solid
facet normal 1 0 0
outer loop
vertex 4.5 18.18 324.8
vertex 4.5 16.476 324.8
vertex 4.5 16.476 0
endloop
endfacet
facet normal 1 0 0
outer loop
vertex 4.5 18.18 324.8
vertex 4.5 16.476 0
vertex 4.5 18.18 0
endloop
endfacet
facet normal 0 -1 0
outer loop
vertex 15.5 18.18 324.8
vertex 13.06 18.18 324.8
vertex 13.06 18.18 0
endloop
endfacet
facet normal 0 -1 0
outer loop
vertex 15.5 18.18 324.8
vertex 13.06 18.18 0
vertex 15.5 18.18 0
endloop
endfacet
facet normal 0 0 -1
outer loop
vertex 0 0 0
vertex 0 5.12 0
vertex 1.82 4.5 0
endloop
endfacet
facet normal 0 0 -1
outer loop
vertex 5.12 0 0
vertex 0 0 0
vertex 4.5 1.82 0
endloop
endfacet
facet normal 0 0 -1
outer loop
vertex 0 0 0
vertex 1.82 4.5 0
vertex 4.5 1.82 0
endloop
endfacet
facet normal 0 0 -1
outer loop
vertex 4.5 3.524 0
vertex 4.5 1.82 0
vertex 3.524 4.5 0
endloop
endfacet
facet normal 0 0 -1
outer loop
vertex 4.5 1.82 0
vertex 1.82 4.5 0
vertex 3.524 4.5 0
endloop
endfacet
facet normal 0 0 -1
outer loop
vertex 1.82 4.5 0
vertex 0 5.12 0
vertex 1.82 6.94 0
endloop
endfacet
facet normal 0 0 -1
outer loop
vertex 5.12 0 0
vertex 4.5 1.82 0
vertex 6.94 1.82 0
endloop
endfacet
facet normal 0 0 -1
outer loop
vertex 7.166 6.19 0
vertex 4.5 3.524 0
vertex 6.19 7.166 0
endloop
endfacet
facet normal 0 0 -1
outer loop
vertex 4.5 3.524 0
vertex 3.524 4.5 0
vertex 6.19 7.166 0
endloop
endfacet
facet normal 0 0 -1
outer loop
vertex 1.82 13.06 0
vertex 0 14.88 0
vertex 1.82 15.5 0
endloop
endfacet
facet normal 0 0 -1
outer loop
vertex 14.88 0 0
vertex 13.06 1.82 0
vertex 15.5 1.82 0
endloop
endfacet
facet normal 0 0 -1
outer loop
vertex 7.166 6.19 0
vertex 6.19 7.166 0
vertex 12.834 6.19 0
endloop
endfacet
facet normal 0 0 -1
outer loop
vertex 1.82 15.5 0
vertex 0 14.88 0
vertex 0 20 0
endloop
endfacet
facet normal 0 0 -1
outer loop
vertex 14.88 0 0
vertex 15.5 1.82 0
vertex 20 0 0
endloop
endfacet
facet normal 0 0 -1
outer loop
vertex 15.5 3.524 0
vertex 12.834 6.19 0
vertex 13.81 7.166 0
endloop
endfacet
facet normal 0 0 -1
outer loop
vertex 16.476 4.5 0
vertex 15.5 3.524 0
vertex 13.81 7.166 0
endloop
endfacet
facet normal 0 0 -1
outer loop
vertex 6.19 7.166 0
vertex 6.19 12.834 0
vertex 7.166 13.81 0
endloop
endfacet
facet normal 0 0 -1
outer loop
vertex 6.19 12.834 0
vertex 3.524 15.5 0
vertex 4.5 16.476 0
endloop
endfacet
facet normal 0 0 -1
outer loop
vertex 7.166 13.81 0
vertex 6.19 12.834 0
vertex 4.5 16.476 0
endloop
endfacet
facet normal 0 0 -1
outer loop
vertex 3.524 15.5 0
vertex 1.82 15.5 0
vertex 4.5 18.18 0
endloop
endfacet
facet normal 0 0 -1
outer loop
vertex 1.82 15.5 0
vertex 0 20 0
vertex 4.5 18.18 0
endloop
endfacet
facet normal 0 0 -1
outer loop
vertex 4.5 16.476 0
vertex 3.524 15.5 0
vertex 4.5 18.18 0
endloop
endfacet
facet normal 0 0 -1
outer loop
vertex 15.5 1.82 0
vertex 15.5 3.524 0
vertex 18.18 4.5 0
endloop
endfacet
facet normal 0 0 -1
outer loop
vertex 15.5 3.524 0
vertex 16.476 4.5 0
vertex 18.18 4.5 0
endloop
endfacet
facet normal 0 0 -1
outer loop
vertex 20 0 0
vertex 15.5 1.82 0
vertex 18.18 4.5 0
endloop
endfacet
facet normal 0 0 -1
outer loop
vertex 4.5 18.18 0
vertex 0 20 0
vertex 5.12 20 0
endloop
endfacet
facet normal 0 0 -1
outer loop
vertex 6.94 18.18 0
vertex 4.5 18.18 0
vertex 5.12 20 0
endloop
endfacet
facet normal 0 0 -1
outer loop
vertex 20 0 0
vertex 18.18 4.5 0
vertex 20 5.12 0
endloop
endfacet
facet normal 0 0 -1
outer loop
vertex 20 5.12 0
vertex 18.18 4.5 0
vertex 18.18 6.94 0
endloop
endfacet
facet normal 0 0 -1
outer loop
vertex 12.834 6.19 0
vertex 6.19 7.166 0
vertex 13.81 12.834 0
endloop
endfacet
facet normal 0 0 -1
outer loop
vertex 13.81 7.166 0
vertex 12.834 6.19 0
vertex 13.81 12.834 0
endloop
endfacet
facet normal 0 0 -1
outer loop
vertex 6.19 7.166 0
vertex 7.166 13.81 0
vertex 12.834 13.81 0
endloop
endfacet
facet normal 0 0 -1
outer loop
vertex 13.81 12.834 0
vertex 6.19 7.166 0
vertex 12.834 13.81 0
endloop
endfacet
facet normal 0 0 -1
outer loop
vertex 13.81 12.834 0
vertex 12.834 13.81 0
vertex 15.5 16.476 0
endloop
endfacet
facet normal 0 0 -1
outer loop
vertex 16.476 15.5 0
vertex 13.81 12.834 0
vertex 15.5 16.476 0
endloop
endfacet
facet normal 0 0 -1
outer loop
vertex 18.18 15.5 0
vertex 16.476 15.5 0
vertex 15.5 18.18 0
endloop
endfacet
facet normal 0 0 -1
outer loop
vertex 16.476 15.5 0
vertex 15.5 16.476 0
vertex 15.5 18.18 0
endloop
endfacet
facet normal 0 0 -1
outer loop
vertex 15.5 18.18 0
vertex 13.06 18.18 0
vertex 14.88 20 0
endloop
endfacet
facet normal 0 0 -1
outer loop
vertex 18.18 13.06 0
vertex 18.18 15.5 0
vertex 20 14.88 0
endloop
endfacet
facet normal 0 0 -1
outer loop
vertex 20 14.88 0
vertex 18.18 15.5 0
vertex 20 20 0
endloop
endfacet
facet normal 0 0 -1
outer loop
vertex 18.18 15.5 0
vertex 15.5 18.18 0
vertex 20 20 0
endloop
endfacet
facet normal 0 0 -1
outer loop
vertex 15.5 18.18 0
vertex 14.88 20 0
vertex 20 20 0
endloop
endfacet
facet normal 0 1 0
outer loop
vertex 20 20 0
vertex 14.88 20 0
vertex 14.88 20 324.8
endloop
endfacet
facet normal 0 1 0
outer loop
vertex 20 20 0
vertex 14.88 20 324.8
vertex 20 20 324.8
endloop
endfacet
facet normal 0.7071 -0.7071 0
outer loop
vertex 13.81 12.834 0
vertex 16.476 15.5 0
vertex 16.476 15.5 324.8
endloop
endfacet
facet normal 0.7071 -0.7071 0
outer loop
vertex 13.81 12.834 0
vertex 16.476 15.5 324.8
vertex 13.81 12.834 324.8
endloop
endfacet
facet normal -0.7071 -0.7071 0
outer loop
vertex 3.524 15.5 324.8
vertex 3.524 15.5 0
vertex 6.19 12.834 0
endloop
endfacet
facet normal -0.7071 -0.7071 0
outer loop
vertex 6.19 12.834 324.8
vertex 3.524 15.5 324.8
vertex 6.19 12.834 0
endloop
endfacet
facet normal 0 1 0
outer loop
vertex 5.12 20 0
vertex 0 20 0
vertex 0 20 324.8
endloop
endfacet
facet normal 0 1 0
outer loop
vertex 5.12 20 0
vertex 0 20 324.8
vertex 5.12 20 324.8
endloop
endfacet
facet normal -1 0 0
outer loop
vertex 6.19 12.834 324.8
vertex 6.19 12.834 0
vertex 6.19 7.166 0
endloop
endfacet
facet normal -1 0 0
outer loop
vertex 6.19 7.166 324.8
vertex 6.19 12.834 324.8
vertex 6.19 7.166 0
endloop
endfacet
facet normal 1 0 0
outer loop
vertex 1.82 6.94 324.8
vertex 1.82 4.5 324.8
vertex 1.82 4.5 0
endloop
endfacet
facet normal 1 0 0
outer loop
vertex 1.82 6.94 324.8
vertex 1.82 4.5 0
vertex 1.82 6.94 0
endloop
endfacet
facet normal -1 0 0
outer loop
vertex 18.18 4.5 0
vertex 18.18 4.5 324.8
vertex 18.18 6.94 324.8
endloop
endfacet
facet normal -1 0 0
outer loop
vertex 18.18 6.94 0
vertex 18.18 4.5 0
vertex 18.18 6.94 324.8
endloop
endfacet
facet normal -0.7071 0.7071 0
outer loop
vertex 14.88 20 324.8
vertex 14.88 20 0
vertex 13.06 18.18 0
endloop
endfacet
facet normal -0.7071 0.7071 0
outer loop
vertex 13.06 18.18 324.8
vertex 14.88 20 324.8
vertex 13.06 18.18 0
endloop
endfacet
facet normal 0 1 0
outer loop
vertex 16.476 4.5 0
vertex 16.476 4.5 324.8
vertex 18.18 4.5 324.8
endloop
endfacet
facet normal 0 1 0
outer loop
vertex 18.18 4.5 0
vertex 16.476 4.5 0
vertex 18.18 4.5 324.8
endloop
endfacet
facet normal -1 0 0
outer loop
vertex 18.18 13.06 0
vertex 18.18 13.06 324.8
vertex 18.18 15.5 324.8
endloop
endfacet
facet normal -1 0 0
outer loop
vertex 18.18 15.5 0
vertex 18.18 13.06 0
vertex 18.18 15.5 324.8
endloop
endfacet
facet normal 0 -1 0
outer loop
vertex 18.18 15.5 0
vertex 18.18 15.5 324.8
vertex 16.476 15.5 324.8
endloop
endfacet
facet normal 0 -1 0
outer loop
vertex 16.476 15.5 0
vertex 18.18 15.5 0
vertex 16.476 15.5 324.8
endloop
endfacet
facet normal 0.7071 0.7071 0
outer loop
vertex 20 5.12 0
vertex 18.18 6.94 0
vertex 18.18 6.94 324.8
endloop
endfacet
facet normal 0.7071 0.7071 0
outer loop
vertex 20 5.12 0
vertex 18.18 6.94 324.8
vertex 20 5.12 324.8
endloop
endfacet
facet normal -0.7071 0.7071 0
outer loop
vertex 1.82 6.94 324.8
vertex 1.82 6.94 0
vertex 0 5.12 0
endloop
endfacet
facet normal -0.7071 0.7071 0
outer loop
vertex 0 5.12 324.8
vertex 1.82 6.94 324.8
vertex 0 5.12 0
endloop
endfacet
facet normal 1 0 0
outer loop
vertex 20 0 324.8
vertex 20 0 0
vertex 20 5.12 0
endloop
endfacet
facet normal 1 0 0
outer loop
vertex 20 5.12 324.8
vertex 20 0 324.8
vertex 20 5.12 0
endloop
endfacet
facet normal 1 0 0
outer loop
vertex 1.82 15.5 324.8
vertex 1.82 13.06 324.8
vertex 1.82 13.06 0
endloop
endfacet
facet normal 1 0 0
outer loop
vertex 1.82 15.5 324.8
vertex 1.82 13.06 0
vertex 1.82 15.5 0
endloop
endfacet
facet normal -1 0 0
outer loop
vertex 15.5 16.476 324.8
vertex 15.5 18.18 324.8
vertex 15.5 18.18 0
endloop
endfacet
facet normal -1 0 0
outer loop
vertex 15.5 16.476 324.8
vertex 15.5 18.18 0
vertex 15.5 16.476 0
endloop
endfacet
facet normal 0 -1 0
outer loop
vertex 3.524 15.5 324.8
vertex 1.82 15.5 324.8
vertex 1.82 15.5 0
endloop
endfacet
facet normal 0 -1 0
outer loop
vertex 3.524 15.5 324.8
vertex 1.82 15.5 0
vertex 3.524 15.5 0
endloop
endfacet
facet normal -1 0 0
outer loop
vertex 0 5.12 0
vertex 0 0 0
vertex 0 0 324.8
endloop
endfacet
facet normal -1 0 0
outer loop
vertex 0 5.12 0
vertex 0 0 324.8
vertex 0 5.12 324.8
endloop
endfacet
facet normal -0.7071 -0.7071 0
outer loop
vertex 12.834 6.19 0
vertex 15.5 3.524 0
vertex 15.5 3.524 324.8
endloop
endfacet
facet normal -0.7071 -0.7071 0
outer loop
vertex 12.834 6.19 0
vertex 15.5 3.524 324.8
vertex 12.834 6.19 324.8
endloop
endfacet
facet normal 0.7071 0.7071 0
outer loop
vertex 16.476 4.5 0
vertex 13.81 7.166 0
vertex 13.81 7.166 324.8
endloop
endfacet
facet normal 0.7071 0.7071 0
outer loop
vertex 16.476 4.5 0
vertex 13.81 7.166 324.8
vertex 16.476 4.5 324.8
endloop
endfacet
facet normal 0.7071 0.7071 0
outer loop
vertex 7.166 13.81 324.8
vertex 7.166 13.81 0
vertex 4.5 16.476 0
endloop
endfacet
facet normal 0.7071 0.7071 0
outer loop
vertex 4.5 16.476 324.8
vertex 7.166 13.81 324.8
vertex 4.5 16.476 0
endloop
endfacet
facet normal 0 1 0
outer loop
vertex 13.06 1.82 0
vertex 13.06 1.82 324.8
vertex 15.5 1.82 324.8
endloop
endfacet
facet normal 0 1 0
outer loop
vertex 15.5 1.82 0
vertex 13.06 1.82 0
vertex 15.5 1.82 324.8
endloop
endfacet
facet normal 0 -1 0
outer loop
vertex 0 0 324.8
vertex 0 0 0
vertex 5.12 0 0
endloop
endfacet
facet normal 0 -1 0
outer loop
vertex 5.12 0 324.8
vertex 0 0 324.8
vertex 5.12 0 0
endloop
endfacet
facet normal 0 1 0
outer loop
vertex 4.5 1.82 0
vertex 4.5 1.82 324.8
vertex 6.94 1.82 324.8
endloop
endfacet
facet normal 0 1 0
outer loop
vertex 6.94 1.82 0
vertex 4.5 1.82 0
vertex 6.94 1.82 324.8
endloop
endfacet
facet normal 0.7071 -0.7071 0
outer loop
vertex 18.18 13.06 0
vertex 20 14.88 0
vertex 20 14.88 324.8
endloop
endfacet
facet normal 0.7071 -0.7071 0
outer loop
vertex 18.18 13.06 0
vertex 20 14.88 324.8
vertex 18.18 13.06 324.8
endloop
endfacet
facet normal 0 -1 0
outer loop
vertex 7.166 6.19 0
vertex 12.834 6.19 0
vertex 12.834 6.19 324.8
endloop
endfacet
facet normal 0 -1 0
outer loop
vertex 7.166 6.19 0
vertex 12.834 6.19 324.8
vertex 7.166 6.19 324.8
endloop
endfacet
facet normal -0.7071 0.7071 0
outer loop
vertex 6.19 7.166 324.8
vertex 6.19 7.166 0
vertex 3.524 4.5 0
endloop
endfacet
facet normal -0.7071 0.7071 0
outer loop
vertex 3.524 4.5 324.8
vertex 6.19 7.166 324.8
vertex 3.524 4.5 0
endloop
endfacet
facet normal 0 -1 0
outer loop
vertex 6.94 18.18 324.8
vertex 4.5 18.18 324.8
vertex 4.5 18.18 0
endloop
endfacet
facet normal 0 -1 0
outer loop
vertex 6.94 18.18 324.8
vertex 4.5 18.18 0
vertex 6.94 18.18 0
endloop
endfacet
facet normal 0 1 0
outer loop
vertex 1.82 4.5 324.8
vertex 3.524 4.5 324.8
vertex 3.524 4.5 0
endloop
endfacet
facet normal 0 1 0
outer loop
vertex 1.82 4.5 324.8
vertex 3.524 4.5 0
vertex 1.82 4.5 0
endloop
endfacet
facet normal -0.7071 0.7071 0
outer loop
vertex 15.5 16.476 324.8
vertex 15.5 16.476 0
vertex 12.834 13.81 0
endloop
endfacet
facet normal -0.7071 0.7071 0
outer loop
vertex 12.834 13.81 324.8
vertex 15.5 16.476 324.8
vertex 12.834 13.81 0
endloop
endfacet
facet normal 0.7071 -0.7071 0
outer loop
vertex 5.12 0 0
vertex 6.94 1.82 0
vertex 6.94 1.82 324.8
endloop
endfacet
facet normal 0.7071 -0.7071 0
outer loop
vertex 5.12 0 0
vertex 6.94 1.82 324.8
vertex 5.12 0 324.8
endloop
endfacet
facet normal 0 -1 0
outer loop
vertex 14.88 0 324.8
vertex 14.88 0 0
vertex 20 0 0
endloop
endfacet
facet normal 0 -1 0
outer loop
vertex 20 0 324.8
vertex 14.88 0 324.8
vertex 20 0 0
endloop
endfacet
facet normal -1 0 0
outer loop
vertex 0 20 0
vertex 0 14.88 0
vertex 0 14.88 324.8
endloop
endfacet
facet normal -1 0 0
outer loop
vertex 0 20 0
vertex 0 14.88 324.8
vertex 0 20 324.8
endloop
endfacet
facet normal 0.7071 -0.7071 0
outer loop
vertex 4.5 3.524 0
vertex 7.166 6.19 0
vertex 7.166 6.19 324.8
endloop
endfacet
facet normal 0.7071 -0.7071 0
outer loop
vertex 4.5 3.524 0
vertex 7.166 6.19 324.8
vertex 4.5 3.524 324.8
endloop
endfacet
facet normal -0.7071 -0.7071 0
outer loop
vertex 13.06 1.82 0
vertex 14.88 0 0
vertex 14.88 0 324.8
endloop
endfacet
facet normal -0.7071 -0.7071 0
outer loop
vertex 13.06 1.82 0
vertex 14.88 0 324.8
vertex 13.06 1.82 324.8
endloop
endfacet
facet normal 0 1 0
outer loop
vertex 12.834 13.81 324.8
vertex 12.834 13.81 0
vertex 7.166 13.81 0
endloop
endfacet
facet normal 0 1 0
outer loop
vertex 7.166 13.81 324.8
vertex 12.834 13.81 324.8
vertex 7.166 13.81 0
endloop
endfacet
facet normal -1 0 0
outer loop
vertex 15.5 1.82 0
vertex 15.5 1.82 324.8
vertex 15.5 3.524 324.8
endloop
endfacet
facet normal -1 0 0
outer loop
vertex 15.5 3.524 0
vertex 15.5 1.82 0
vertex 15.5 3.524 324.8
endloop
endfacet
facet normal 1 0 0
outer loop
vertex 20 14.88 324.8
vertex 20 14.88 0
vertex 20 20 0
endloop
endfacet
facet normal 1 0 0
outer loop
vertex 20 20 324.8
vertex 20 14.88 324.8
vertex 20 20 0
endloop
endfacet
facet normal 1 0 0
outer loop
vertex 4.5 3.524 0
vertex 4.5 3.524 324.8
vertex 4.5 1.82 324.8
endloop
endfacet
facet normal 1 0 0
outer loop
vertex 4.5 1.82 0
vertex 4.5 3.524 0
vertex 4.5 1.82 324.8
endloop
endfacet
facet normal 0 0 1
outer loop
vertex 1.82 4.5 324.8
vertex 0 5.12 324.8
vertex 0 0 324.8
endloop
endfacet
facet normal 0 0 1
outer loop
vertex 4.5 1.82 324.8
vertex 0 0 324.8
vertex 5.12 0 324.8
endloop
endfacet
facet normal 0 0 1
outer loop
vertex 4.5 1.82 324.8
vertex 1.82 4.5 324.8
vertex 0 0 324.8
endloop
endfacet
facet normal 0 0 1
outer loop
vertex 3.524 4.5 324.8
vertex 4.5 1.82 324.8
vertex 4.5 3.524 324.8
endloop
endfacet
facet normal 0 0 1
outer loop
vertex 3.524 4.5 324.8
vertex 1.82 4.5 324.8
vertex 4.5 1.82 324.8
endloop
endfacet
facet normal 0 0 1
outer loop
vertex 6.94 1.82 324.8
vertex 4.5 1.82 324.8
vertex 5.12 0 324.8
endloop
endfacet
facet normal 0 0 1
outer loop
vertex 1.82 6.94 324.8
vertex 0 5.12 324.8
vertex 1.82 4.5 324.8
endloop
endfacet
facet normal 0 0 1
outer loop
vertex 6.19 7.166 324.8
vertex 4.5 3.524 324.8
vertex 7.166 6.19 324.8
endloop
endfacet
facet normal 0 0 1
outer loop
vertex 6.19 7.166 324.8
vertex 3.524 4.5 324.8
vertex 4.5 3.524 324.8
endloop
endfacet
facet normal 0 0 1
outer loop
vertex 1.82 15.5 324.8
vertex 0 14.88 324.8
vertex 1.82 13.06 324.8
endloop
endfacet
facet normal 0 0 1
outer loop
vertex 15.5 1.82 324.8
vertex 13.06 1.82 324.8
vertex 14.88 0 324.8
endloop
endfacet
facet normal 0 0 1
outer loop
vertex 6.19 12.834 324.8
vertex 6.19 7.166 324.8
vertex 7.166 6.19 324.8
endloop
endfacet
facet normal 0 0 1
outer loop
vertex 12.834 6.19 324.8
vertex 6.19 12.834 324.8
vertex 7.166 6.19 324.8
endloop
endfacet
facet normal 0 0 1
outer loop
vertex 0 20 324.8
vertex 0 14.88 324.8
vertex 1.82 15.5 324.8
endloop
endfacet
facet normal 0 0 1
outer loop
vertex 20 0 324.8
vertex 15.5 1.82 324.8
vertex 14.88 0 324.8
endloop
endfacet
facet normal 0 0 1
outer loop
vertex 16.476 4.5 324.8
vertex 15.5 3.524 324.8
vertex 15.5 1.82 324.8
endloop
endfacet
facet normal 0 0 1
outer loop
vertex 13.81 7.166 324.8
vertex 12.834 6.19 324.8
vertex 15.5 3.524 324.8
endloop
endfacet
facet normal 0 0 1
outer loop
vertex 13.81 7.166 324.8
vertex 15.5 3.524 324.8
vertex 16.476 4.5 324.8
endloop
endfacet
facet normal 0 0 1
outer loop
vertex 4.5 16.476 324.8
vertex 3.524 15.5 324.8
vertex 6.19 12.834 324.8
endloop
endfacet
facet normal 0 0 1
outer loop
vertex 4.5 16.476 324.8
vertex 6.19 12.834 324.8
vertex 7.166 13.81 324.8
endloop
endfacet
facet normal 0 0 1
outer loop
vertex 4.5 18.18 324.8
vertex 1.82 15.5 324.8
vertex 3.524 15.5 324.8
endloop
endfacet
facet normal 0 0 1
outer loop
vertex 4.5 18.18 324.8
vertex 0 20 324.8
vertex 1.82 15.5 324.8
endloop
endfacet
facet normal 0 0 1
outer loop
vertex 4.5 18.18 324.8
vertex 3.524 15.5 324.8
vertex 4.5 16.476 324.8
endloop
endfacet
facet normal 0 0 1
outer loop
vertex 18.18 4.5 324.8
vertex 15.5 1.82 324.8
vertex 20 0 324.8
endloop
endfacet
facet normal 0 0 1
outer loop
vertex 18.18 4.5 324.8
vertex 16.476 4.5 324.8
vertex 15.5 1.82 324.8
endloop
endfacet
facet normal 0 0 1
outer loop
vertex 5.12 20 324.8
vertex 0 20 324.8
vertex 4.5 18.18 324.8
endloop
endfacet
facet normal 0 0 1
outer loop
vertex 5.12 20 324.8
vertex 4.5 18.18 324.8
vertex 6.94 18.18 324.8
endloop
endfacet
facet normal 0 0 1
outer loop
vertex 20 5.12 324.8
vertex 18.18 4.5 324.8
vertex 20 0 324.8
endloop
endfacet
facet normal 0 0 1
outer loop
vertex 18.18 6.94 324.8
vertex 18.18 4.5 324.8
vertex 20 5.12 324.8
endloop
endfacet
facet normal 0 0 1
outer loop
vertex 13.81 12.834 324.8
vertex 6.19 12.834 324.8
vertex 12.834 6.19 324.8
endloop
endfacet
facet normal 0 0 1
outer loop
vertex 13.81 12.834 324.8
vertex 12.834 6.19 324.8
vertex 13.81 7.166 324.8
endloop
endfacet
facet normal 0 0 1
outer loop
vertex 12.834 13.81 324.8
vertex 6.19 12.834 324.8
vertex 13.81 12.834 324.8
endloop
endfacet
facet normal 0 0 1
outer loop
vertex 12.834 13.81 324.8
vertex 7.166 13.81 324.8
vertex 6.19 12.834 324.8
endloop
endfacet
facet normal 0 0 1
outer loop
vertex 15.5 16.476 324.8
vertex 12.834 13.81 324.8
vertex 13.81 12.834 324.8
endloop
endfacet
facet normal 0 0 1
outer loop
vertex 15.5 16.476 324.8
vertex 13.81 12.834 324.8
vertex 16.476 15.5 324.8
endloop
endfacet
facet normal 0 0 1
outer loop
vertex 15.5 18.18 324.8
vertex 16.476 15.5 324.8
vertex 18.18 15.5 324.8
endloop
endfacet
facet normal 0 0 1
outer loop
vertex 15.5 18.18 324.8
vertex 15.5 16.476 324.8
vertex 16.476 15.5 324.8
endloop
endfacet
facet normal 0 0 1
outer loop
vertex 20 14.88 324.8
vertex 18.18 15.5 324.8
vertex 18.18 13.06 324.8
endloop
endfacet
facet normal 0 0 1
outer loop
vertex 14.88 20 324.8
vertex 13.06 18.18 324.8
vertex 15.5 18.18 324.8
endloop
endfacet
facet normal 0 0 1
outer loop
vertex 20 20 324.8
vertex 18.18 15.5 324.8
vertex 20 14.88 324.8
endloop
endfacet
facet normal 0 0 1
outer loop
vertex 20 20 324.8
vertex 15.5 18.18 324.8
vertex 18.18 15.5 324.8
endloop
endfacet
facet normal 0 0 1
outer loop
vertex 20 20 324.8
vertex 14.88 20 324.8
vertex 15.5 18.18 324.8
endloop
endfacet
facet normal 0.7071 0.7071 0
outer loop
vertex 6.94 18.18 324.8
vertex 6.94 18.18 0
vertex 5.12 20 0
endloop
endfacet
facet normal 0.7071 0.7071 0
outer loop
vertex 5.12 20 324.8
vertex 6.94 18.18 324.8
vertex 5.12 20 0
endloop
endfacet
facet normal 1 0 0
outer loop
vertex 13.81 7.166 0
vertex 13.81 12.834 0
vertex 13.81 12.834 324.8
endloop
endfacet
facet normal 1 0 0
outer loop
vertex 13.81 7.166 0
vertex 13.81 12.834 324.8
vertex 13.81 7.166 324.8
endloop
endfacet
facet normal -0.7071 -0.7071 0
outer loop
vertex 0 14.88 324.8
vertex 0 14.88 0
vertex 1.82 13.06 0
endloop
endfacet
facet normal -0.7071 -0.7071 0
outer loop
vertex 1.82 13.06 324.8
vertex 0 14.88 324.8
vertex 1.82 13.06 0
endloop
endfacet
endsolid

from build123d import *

# Parameters (mm, degrees)
SKETCH1_W           = 20
SKETCH1_H           = 20
BOSS_EXTRUDE1_DEPTH = 324.8
CUT_EXTRUDE1_DEPTH  = 325.8


with BuildPart() as part:
    # Sketch1 → Boss-Extrude1 (new body)
    with BuildSketch(Plane.XY):
        with Locations((10, 10)):
            Rectangle(SKETCH1_W, SKETCH1_H)
    extrude(amount=BOSS_EXTRUDE1_DEPTH)

    # Sketch2 → Cut-Extrude1 (cut, through all)
    with BuildSketch(Plane.XY.offset(324.8)):
        Polygon((4.5, 18.18), (6.94, 18.18), (5.12, 20), (14.88, 20), (13.06, 18.18), (15.5, 18.18), (15.5, 16.475807358), (12.834192642, 13.81), (7.165807358, 13.81), (4.5, 16.475807358), align=None)
        Polygon((14.88, 0), (13.06, 1.82), (15.5, 1.82), (15.5, 3.524192642), (12.834192642, 6.19), (7.165807358, 6.19), (4.5, 3.524192642), (4.5, 1.82), (6.94, 1.82), (5.12, 0), align=None)
        Polygon((1.82, 4.5), (1.82, 6.94), (0, 5.12), (0, 14.88), (1.82, 13.06), (1.82, 15.5), (3.524192642, 15.5), (6.19, 12.834192642), (6.19, 7.165807358), (3.524192642, 4.5), align=None)
        Polygon((20, 14.88), (18.18, 13.06), (18.18, 15.5), (16.475807358, 15.5), (13.81, 12.834192642), (13.81, 7.165807358), (16.475807358, 4.5), (18.18, 4.5), (18.18, 6.94), (20, 5.12), align=None)
    extrude(amount=-CUT_EXTRUDE1_DEPTH, mode=Mode.SUBTRACT)


solid = part.part
